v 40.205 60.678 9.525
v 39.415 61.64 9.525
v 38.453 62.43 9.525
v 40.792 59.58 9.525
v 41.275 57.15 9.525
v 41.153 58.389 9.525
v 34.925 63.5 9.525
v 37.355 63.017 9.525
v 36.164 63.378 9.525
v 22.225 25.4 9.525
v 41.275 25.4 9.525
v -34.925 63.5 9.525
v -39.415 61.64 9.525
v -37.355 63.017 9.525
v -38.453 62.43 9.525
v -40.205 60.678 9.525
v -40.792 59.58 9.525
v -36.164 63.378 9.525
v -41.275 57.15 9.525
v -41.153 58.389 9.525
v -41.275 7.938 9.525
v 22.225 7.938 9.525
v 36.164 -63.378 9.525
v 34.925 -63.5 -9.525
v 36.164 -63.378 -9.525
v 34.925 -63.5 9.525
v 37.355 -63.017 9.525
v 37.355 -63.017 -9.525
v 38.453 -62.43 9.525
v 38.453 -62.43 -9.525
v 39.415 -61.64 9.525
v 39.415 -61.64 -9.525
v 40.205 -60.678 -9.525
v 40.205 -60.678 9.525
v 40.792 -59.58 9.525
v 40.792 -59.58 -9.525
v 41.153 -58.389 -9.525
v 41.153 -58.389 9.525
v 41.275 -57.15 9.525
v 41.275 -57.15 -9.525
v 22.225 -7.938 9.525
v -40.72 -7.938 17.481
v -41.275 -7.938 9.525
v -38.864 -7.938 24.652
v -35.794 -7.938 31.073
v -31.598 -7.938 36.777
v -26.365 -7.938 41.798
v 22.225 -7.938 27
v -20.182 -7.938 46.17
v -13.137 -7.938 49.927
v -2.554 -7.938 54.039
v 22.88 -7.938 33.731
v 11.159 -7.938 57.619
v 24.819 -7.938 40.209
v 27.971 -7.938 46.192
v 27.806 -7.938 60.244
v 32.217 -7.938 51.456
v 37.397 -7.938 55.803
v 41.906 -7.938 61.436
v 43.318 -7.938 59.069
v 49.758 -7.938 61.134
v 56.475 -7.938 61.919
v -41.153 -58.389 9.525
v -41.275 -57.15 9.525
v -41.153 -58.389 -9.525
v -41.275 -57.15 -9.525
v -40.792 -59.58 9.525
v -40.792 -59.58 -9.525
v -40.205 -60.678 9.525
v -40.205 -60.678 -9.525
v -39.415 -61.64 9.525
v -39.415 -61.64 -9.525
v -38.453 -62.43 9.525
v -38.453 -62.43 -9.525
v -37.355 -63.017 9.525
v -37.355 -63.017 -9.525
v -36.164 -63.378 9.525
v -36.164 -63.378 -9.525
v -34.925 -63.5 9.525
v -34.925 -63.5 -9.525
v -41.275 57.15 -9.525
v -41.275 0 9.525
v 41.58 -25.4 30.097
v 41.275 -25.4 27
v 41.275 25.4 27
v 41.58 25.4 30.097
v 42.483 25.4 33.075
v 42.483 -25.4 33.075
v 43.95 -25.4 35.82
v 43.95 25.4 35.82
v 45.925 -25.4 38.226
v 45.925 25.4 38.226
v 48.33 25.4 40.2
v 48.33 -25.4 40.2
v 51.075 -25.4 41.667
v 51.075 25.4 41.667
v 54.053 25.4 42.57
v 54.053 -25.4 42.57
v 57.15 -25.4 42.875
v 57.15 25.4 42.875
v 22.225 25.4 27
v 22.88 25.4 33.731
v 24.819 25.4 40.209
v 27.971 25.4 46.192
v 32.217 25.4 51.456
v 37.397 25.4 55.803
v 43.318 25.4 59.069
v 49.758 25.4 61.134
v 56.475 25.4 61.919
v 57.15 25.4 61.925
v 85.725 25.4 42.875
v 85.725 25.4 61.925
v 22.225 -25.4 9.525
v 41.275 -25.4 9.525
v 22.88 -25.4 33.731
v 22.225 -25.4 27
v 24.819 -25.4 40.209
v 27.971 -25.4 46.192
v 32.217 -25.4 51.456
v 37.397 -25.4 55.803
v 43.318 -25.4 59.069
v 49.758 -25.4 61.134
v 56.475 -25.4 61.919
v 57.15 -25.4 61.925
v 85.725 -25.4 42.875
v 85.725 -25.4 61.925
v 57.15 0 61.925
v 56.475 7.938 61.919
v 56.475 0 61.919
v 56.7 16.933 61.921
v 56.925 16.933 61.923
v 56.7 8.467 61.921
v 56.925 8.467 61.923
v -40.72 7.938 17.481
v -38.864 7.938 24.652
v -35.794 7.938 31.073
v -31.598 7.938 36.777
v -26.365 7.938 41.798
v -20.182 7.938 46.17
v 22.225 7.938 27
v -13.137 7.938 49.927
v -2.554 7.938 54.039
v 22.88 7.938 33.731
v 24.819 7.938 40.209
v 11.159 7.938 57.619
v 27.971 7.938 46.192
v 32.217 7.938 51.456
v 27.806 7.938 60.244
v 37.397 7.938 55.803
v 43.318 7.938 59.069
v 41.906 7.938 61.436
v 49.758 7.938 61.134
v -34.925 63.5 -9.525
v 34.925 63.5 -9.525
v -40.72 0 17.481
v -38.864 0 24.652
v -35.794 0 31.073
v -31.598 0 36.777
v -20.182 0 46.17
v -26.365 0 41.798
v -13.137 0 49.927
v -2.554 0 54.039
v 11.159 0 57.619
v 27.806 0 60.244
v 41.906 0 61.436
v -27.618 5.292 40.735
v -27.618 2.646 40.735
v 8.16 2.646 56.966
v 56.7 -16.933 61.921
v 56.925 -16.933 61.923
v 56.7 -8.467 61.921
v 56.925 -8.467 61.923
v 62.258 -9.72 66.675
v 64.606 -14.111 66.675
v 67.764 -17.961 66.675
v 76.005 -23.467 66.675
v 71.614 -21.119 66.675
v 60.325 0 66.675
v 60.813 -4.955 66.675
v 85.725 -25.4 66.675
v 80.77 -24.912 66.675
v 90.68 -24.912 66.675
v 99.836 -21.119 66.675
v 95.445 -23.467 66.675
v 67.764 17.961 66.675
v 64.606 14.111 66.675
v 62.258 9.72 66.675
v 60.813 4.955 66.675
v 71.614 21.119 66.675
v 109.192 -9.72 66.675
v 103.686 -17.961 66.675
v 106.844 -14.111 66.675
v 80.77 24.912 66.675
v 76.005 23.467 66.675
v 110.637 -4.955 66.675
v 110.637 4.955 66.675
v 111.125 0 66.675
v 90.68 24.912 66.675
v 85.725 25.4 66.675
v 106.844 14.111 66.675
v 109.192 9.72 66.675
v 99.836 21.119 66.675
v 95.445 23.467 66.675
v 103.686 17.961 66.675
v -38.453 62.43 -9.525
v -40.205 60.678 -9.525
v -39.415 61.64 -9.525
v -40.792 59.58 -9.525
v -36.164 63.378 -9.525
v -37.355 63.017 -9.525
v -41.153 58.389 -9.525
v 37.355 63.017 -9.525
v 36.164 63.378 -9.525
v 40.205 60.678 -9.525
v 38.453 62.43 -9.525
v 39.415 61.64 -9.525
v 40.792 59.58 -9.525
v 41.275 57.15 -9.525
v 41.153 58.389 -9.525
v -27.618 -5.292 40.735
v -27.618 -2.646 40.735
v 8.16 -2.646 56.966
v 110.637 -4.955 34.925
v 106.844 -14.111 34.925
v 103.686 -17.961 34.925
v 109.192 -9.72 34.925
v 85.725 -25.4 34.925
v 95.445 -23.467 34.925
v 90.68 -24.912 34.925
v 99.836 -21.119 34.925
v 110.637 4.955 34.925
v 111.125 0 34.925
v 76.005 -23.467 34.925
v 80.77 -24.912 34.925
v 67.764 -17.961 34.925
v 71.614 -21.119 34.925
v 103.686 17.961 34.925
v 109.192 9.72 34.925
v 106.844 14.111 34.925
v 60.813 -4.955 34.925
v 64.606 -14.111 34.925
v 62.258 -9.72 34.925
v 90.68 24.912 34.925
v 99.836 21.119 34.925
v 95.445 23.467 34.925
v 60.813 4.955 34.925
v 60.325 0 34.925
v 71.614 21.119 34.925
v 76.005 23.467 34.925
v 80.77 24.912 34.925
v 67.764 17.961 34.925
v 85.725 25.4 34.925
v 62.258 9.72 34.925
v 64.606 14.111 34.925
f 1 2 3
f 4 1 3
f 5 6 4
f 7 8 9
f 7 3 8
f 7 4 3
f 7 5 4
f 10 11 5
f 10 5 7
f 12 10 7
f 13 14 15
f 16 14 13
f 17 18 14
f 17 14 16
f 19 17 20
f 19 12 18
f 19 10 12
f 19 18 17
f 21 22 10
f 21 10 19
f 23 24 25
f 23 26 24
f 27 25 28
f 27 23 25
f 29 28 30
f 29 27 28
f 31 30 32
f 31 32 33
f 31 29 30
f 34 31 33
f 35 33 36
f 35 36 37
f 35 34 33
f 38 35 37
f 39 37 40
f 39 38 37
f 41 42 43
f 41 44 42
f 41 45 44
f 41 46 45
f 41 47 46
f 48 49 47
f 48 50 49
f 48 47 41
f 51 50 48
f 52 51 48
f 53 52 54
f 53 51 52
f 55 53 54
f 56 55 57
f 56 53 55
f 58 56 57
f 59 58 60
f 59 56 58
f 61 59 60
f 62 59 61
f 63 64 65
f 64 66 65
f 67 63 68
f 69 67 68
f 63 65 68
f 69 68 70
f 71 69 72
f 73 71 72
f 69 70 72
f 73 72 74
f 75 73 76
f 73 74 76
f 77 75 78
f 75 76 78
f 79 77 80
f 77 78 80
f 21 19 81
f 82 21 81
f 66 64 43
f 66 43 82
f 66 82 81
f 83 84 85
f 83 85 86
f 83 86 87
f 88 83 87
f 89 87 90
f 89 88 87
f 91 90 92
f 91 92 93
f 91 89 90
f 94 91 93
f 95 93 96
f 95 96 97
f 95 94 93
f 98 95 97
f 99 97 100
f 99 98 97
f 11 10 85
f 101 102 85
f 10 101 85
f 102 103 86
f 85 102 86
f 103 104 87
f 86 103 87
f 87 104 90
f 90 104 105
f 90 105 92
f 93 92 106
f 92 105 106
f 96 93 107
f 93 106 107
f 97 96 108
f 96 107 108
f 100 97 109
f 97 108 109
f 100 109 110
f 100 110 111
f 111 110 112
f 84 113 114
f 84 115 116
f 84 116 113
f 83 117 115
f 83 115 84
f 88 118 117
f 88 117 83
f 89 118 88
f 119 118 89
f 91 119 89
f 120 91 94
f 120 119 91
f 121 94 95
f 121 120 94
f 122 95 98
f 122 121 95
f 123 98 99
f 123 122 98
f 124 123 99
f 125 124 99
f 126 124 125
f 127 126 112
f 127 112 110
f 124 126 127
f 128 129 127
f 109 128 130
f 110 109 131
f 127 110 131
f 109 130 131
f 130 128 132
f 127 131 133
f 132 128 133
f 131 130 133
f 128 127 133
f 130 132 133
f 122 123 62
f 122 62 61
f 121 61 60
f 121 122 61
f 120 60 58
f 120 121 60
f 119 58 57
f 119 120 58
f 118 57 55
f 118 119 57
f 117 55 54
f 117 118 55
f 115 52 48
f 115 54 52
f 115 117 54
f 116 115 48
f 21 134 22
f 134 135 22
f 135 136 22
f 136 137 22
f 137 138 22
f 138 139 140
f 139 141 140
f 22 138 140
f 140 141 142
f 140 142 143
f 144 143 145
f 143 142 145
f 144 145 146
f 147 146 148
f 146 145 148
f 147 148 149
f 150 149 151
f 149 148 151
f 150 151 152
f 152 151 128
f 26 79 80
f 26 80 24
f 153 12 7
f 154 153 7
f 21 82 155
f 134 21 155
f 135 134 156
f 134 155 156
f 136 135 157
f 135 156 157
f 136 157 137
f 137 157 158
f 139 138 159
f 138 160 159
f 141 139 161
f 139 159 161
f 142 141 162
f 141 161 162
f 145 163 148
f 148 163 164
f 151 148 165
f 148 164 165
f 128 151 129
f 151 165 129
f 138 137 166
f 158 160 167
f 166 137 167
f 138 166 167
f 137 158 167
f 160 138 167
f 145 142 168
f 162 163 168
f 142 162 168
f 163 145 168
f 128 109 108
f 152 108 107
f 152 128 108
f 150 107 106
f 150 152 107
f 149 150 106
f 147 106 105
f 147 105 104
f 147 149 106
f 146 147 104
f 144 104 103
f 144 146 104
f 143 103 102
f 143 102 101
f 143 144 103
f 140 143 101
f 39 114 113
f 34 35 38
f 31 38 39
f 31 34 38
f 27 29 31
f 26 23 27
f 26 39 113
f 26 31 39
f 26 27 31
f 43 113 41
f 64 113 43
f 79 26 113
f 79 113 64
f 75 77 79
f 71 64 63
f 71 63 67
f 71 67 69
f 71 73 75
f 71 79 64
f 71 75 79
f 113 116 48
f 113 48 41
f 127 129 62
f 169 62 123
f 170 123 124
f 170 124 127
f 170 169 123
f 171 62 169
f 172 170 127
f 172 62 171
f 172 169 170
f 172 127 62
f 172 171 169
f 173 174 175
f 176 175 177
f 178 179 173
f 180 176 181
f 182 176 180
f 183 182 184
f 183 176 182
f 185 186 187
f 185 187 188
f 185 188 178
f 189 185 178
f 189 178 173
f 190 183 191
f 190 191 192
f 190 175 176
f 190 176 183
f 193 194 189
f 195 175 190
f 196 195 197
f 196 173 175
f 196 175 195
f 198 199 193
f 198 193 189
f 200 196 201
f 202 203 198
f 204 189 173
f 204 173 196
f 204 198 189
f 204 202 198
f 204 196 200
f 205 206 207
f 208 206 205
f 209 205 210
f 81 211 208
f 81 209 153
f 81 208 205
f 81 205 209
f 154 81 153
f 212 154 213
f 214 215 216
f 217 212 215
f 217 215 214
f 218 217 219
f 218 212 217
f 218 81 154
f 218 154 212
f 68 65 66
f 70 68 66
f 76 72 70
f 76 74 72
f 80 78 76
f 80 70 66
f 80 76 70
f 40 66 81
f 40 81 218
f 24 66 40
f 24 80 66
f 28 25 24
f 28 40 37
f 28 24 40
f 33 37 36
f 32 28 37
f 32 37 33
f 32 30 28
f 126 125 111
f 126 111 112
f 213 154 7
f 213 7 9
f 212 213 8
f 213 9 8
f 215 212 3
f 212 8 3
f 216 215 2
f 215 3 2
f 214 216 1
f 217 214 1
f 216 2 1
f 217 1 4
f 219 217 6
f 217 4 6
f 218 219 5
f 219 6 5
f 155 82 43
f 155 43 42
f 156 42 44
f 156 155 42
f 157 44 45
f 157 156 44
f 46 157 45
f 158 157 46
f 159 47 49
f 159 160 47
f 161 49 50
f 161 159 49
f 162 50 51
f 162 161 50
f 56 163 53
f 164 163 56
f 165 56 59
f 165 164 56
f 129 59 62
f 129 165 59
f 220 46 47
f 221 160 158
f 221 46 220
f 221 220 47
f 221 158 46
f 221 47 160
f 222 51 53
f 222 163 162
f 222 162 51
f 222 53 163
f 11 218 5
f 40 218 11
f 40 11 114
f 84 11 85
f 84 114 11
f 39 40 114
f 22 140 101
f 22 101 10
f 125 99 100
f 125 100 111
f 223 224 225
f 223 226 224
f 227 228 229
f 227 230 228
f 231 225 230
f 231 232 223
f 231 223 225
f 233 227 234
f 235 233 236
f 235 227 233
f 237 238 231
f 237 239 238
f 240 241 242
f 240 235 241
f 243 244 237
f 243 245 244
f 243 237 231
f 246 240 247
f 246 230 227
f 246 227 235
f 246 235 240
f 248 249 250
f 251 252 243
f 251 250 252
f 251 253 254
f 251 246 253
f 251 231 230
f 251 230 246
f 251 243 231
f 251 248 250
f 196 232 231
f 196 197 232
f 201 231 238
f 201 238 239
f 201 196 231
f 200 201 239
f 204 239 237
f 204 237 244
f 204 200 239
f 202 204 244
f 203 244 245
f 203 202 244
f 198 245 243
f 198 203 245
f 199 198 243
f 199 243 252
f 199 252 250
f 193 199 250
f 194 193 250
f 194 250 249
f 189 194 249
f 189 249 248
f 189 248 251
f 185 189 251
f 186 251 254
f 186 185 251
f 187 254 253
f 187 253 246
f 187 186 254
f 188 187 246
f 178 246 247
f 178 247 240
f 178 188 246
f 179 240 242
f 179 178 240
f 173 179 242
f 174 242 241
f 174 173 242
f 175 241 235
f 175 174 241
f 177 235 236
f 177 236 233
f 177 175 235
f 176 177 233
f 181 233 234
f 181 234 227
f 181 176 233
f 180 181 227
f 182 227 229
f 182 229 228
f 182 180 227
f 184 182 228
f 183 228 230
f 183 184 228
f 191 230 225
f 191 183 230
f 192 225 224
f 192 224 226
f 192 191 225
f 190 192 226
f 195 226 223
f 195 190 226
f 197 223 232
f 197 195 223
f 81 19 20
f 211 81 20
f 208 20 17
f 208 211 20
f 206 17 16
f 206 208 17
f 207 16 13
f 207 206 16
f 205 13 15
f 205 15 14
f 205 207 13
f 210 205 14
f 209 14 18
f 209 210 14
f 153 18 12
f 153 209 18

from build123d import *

# Parameters (mm, degrees)
F1_DEPTH = 63.5
F0_W     = 25.4
F0_H     = 19.05
F2_DEPTH = 25.4
F3_DEPTH = 7.9375
F5_R     = 6.35


with BuildPart() as f1:
    # F0 (on Front) → F1 (new body, symmetric)
    with BuildSketch(Plane.XZ):
        Polygon((41.275, -9.525), (41.275, 9.525), (22.225, 9.525), (-41.275, 9.525), (-41.275, -9.525), align=None)
    extrude(amount=F1_DEPTH, both=True)

    # F0 (on Front) → F2 (join, symmetric)
    with BuildSketch(Plane.XZ):
        with BuildLine():
            Line((22.225, 9.525), (41.275, 9.525))
            Line((41.275, 9.525), (41.275, 27.0002))
            ThreePointArc((41.275, 27.0002), (45.9246798487, 38.2255201513), (57.15, 42.8752))
            Line((57.15, 42.8752), (60.325, 42.8752))
            Line((60.325, 42.8752), (60.325, 61.9252))
            Line((60.325, 61.9252), (57.15, 61.9252))
            add(Edge.make_bspline(
                [(56.4747169811, 61.9186710124), (56.6997276524, 61.9210648372), (56.9248231991, 61.9232407005), (57.15, 61.9252)],
                knots=[111.0184231713, 111.0184231713, 111.0184231713, 111.0184231713, 111.5045361635, 111.5045361635, 111.5045361635, 111.5045361635], degree=3))
            ThreePointArc((56.4747169811, 61.9186710124), (32.216690107, 51.4559903733), (22.225, 27.0002))
            Line((22.225, 27.0002), (22.225, 9.525))
        make_face()
        with Locations((73.025, 52.4002)):
            Rectangle(F0_W, F0_H)
    extrude(amount=F2_DEPTH, both=True)

    # F0 (on Front) → F3 (join, symmetric)
    with BuildSketch(Plane.XZ):
        with BuildLine():
            Line((-41.275, 9.525), (22.225, 9.525))
            Line((22.225, 9.525), (22.225, 27.0002))
            ThreePointArc((22.225, 27.0002), (32.216690107, 51.4559903733), (56.4747169811, 61.9186710124))
            add(Edge.make_bspline(
                [(-41.275, 9.525), (-41.8742249789, 49.4569702257), (5.0868085597, 61.3719696076), (56.4747169811, 61.9186710124)],
                knots=[0, 0, 0, 0, 111.0184231713, 111.0184231713, 111.0184231713, 111.0184231713], degree=3))
        make_face()
    extrude(amount=F3_DEPTH, both=True)

    # F5
    f5_edges = [f1.edges().sort_by_distance(p)[0] for p in [
        (41.275, -63.5, 0),
        (-41.275, -63.5, 0),
        (-41.275, 63.5, 0),
        (41.275, 63.5, 0),
    ]]
    fillet(f5_edges, radius=F5_R)


with BuildPart() as f4:
    # F0 (on Front) → F4 (revolve)
    with BuildSketch(Plane.XZ):
        Polygon((85.725, 61.9252), (85.725, 42.8752), (85.725, 34.925), (111.125, 34.925), (111.125, 66.675), (85.725, 66.675), align=None)
    revolve(axis=Axis((85.725, 0, 50.8), (0, 0, 1)))


solid = Compound([f1.part, f4.part])
